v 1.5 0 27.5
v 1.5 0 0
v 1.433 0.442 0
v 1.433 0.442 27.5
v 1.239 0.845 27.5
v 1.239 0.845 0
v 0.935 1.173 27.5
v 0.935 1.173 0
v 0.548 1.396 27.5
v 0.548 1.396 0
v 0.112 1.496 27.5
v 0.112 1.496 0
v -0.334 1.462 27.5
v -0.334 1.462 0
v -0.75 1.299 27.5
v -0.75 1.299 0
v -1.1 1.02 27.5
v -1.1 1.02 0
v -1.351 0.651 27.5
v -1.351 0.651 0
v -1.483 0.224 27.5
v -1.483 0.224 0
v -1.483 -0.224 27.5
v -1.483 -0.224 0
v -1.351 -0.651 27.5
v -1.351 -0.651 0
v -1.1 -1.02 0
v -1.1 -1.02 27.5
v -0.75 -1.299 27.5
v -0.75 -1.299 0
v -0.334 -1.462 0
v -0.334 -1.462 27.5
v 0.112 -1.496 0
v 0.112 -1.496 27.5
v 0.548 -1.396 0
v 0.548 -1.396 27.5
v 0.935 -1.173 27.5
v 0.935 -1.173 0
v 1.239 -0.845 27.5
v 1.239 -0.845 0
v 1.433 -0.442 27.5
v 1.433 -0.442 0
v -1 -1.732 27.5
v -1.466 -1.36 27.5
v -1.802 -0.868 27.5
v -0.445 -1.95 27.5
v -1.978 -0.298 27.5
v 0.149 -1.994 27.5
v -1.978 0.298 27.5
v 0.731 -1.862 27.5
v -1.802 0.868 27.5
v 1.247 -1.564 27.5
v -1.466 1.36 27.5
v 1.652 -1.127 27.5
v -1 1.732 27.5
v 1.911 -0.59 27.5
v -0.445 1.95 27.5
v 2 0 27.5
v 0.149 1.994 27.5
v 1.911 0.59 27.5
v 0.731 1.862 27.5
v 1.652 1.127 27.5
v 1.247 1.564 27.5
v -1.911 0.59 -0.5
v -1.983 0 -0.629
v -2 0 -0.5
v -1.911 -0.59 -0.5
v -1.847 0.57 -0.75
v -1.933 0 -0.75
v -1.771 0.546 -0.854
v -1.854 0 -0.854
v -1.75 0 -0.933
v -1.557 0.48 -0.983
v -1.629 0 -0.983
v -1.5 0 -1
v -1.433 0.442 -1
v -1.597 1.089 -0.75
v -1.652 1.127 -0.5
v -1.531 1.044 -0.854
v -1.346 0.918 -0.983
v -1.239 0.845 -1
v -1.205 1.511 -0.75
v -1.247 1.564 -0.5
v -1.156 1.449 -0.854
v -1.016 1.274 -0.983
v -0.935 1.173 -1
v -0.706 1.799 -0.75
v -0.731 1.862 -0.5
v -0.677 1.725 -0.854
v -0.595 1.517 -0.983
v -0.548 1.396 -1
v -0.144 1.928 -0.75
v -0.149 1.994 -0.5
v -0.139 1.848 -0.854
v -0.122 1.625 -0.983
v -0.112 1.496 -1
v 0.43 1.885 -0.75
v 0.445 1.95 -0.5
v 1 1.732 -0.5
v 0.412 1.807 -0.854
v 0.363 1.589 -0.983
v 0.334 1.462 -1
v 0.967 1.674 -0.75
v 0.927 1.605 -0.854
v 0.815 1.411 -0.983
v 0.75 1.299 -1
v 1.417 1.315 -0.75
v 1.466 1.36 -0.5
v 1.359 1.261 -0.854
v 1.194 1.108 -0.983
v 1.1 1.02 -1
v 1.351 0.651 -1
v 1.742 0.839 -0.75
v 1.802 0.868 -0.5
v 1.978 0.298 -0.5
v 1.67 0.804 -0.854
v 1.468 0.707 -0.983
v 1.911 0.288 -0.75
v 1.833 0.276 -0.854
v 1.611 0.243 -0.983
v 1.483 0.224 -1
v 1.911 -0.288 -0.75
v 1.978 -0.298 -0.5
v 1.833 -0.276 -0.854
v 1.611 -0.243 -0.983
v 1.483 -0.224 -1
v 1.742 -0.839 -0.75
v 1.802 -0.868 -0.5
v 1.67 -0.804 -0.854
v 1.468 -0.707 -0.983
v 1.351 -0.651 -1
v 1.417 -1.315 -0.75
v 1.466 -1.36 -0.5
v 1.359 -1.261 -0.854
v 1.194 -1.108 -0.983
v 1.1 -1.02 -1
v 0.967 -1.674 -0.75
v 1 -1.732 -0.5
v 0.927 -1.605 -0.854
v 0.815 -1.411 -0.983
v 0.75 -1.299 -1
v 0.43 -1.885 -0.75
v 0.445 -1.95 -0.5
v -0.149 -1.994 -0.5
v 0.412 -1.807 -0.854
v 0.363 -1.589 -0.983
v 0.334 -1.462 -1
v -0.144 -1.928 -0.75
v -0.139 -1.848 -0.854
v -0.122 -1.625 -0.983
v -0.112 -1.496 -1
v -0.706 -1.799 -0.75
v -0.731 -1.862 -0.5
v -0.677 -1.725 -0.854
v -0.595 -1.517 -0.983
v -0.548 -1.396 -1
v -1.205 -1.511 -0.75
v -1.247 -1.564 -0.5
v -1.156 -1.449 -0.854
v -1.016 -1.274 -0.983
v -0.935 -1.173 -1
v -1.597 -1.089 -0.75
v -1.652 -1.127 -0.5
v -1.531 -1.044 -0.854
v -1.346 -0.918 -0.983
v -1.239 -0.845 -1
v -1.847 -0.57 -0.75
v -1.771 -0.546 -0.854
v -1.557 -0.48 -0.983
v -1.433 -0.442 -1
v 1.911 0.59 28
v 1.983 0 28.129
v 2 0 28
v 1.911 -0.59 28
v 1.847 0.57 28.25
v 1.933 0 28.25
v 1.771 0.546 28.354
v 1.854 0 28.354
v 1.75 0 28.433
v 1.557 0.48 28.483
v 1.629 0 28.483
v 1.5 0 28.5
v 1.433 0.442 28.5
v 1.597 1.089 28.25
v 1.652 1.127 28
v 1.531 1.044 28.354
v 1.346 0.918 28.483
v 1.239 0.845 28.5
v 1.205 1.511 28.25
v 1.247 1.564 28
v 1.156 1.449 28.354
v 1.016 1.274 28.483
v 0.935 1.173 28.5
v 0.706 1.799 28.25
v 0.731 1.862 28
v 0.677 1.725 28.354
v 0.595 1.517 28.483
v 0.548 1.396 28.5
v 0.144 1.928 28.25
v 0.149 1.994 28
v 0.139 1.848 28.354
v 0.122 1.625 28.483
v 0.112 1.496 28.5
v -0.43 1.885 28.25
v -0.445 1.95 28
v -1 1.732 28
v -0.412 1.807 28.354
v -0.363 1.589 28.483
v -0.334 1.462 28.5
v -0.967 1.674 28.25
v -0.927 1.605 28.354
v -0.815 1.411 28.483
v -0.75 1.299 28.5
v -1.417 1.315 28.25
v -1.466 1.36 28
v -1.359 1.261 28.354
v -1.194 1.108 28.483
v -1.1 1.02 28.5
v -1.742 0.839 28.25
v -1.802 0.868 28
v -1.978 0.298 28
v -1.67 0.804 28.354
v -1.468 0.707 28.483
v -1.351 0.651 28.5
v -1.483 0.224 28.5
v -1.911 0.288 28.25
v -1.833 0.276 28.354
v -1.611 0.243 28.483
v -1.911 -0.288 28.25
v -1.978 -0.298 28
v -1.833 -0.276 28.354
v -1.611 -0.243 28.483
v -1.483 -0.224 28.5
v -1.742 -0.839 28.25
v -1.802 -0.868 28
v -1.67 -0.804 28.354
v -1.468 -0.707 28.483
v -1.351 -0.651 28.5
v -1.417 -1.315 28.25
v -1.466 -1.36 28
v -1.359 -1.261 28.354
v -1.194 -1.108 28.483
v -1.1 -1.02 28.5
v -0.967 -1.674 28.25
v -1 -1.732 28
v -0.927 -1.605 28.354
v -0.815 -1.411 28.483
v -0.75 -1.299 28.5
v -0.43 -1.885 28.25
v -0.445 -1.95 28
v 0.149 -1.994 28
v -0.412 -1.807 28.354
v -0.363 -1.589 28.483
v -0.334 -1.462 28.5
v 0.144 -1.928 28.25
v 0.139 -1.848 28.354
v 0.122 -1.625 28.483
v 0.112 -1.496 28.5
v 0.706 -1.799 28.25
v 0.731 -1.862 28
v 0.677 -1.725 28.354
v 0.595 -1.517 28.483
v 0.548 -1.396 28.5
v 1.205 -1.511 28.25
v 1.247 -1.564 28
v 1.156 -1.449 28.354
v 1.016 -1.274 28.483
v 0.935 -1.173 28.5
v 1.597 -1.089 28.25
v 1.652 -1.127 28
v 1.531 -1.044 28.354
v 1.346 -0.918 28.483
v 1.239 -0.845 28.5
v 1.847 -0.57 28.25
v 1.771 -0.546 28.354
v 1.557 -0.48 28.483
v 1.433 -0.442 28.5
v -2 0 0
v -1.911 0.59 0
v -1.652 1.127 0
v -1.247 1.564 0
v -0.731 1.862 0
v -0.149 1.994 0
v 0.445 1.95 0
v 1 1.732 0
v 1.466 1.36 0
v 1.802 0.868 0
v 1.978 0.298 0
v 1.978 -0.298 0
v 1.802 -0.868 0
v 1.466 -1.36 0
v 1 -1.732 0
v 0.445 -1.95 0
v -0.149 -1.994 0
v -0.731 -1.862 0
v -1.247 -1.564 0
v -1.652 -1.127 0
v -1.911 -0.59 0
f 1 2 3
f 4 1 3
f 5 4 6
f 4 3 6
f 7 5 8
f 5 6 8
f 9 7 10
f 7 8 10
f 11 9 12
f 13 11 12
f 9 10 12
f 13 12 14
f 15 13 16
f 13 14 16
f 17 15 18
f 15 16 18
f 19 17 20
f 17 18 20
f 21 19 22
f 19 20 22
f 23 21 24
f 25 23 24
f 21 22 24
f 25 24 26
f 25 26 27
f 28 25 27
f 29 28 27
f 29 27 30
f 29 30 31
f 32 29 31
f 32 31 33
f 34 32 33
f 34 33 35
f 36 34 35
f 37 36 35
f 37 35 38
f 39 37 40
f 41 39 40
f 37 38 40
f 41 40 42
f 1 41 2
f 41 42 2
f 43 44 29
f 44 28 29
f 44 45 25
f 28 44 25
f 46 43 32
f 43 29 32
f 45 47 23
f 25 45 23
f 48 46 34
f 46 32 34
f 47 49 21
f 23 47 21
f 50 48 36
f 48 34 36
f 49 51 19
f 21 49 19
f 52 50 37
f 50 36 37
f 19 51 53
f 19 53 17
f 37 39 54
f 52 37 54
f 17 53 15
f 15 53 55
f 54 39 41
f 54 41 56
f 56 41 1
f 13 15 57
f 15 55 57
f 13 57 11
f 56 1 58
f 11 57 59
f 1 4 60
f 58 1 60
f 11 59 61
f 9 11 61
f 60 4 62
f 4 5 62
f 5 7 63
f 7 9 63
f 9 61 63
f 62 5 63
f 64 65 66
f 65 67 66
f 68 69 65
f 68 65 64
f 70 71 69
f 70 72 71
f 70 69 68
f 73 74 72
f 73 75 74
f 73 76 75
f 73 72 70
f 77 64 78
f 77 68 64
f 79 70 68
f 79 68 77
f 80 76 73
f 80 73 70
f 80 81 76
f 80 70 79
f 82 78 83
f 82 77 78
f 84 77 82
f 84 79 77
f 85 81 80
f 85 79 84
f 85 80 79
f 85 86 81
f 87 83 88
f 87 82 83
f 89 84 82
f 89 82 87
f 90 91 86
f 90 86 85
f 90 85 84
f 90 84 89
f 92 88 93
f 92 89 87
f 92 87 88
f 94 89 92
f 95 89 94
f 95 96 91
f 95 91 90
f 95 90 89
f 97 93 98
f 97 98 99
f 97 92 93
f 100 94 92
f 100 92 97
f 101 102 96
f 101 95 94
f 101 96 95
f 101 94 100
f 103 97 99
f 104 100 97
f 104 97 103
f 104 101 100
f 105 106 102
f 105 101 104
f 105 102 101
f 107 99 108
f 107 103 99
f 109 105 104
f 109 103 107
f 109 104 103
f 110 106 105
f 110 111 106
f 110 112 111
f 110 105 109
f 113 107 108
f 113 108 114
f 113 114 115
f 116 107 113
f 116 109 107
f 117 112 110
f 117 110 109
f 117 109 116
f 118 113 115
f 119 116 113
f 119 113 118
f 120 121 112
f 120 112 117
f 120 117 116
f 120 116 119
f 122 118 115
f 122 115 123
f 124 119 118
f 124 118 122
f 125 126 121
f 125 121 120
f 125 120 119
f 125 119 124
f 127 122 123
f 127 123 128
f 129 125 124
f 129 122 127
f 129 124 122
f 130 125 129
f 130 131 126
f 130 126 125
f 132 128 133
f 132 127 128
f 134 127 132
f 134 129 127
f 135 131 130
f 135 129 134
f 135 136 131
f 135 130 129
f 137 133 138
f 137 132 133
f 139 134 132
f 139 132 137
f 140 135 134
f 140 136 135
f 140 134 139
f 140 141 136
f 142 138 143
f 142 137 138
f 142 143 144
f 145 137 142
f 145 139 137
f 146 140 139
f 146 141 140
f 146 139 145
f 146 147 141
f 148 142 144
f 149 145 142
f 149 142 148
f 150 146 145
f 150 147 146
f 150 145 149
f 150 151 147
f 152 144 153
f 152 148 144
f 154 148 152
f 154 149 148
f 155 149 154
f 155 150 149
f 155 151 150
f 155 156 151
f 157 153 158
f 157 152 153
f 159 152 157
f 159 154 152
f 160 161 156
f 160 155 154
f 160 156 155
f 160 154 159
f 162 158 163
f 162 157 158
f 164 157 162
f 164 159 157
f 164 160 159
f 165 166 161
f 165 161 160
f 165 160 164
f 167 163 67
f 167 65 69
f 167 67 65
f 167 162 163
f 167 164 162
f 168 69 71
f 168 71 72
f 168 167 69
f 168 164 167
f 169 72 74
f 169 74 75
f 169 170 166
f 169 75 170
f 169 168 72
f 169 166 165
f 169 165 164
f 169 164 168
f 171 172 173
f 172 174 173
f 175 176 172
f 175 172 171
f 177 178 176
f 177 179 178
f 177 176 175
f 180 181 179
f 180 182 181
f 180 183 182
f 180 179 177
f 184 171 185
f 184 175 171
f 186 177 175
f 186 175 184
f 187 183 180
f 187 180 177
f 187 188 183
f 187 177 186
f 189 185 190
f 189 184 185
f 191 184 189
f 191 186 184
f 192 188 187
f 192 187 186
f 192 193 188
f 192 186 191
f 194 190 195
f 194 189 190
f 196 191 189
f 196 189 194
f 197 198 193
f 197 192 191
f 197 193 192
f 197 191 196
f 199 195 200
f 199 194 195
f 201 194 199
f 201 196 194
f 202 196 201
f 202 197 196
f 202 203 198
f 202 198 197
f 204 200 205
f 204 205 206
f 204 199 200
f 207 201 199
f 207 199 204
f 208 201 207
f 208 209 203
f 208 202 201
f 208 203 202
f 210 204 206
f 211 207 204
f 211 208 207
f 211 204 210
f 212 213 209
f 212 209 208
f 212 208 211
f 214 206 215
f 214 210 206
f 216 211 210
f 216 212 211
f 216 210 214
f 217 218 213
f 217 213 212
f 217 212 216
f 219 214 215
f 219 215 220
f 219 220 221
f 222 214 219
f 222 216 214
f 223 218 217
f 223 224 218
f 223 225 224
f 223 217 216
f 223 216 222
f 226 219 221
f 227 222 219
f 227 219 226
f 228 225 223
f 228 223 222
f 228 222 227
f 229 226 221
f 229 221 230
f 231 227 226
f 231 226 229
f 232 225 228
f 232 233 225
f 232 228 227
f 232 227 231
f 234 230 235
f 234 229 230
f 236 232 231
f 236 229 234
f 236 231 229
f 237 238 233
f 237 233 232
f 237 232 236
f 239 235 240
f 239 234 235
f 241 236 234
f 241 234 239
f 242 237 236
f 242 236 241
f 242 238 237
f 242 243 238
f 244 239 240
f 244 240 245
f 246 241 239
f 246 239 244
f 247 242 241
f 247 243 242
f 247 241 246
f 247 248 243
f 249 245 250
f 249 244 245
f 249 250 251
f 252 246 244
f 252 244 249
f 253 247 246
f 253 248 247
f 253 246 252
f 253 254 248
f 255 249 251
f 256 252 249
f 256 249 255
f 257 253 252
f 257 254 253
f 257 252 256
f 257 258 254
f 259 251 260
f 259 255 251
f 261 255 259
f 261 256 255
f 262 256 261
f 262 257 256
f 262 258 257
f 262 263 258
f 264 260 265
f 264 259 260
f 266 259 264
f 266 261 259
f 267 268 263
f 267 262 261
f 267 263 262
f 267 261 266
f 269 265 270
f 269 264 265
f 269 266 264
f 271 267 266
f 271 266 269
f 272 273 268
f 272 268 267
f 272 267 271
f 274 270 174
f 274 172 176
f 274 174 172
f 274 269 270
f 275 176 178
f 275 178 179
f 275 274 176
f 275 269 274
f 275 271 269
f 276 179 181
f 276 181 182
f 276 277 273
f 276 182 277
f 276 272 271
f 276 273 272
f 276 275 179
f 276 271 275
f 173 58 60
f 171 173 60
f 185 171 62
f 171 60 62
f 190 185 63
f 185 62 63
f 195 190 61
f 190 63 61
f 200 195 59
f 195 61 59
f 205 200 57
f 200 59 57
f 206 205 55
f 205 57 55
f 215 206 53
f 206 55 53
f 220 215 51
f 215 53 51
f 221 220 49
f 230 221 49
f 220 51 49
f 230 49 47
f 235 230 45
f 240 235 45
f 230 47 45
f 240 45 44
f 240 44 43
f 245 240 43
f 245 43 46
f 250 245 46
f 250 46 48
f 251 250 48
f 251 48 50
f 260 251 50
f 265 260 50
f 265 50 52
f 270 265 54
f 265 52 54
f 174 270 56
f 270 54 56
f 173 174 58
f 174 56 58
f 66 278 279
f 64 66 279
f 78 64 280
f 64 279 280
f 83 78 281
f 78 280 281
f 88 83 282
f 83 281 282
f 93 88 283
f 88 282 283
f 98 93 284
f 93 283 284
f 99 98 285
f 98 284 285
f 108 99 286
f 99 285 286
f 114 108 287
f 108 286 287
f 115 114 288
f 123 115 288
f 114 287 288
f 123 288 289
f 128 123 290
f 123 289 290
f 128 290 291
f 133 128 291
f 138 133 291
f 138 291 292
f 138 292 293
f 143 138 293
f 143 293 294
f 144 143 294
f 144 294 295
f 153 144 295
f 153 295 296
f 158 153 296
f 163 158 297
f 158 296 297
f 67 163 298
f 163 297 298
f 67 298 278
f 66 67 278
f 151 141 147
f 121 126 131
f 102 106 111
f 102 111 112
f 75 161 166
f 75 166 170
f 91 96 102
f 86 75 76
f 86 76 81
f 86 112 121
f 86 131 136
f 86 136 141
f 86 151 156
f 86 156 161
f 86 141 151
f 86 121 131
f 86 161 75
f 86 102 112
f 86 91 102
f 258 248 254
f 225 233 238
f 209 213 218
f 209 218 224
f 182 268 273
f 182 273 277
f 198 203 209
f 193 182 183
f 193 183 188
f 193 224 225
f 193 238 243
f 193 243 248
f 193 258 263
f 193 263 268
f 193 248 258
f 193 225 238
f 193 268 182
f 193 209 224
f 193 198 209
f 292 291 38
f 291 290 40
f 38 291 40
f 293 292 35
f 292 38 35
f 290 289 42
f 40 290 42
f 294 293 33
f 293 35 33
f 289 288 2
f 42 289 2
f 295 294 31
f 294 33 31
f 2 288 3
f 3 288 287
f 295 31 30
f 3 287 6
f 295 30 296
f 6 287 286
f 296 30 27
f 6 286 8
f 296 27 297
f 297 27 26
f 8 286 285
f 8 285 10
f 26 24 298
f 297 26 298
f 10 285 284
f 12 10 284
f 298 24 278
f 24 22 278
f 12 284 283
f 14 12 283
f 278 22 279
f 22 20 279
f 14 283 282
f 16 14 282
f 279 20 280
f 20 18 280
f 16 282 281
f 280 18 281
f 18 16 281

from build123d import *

# Parameters (mm, degrees)
SKETCH1_R           = 1.5
BOSS_EXTRUDE1_DEPTH = 27.5
SKETCH2_R           = 2
BOSS_EXTRUDE2_DEPTH = 1
SKETCH3_R           = 2
BOSS_EXTRUDE3_DEPTH = 1
FILLET1_R           = 0.5


with BuildPart() as part:
    # Sketch1 → Boss-Extrude1 (new body)
    with BuildSketch(Plane.XY):
        Circle(SKETCH1_R)
    extrude(amount=BOSS_EXTRUDE1_DEPTH)

    # Sketch2 → Boss-Extrude2 (add)
    with BuildSketch(Plane(origin=(0, 0, 0), x_dir=(-1, 0, 0), z_dir=(0, 0, -1))):
        Circle(SKETCH2_R)
    extrude(amount=BOSS_EXTRUDE2_DEPTH)

    # Sketch3 → Boss-Extrude3 (add)
    with BuildSketch(Plane.XY.offset(27.5)):
        Circle(SKETCH3_R)
    extrude(amount=BOSS_EXTRUDE3_DEPTH)

    # Fillet1
    fillet1_edges = [part.edges().sort_by_distance(p)[0] for p in [
        (-2, 0, 28.5),
        (2, 0, -1),
    ]]
    fillet(fillet1_edges, radius=FILLET1_R)


solid = part.part
